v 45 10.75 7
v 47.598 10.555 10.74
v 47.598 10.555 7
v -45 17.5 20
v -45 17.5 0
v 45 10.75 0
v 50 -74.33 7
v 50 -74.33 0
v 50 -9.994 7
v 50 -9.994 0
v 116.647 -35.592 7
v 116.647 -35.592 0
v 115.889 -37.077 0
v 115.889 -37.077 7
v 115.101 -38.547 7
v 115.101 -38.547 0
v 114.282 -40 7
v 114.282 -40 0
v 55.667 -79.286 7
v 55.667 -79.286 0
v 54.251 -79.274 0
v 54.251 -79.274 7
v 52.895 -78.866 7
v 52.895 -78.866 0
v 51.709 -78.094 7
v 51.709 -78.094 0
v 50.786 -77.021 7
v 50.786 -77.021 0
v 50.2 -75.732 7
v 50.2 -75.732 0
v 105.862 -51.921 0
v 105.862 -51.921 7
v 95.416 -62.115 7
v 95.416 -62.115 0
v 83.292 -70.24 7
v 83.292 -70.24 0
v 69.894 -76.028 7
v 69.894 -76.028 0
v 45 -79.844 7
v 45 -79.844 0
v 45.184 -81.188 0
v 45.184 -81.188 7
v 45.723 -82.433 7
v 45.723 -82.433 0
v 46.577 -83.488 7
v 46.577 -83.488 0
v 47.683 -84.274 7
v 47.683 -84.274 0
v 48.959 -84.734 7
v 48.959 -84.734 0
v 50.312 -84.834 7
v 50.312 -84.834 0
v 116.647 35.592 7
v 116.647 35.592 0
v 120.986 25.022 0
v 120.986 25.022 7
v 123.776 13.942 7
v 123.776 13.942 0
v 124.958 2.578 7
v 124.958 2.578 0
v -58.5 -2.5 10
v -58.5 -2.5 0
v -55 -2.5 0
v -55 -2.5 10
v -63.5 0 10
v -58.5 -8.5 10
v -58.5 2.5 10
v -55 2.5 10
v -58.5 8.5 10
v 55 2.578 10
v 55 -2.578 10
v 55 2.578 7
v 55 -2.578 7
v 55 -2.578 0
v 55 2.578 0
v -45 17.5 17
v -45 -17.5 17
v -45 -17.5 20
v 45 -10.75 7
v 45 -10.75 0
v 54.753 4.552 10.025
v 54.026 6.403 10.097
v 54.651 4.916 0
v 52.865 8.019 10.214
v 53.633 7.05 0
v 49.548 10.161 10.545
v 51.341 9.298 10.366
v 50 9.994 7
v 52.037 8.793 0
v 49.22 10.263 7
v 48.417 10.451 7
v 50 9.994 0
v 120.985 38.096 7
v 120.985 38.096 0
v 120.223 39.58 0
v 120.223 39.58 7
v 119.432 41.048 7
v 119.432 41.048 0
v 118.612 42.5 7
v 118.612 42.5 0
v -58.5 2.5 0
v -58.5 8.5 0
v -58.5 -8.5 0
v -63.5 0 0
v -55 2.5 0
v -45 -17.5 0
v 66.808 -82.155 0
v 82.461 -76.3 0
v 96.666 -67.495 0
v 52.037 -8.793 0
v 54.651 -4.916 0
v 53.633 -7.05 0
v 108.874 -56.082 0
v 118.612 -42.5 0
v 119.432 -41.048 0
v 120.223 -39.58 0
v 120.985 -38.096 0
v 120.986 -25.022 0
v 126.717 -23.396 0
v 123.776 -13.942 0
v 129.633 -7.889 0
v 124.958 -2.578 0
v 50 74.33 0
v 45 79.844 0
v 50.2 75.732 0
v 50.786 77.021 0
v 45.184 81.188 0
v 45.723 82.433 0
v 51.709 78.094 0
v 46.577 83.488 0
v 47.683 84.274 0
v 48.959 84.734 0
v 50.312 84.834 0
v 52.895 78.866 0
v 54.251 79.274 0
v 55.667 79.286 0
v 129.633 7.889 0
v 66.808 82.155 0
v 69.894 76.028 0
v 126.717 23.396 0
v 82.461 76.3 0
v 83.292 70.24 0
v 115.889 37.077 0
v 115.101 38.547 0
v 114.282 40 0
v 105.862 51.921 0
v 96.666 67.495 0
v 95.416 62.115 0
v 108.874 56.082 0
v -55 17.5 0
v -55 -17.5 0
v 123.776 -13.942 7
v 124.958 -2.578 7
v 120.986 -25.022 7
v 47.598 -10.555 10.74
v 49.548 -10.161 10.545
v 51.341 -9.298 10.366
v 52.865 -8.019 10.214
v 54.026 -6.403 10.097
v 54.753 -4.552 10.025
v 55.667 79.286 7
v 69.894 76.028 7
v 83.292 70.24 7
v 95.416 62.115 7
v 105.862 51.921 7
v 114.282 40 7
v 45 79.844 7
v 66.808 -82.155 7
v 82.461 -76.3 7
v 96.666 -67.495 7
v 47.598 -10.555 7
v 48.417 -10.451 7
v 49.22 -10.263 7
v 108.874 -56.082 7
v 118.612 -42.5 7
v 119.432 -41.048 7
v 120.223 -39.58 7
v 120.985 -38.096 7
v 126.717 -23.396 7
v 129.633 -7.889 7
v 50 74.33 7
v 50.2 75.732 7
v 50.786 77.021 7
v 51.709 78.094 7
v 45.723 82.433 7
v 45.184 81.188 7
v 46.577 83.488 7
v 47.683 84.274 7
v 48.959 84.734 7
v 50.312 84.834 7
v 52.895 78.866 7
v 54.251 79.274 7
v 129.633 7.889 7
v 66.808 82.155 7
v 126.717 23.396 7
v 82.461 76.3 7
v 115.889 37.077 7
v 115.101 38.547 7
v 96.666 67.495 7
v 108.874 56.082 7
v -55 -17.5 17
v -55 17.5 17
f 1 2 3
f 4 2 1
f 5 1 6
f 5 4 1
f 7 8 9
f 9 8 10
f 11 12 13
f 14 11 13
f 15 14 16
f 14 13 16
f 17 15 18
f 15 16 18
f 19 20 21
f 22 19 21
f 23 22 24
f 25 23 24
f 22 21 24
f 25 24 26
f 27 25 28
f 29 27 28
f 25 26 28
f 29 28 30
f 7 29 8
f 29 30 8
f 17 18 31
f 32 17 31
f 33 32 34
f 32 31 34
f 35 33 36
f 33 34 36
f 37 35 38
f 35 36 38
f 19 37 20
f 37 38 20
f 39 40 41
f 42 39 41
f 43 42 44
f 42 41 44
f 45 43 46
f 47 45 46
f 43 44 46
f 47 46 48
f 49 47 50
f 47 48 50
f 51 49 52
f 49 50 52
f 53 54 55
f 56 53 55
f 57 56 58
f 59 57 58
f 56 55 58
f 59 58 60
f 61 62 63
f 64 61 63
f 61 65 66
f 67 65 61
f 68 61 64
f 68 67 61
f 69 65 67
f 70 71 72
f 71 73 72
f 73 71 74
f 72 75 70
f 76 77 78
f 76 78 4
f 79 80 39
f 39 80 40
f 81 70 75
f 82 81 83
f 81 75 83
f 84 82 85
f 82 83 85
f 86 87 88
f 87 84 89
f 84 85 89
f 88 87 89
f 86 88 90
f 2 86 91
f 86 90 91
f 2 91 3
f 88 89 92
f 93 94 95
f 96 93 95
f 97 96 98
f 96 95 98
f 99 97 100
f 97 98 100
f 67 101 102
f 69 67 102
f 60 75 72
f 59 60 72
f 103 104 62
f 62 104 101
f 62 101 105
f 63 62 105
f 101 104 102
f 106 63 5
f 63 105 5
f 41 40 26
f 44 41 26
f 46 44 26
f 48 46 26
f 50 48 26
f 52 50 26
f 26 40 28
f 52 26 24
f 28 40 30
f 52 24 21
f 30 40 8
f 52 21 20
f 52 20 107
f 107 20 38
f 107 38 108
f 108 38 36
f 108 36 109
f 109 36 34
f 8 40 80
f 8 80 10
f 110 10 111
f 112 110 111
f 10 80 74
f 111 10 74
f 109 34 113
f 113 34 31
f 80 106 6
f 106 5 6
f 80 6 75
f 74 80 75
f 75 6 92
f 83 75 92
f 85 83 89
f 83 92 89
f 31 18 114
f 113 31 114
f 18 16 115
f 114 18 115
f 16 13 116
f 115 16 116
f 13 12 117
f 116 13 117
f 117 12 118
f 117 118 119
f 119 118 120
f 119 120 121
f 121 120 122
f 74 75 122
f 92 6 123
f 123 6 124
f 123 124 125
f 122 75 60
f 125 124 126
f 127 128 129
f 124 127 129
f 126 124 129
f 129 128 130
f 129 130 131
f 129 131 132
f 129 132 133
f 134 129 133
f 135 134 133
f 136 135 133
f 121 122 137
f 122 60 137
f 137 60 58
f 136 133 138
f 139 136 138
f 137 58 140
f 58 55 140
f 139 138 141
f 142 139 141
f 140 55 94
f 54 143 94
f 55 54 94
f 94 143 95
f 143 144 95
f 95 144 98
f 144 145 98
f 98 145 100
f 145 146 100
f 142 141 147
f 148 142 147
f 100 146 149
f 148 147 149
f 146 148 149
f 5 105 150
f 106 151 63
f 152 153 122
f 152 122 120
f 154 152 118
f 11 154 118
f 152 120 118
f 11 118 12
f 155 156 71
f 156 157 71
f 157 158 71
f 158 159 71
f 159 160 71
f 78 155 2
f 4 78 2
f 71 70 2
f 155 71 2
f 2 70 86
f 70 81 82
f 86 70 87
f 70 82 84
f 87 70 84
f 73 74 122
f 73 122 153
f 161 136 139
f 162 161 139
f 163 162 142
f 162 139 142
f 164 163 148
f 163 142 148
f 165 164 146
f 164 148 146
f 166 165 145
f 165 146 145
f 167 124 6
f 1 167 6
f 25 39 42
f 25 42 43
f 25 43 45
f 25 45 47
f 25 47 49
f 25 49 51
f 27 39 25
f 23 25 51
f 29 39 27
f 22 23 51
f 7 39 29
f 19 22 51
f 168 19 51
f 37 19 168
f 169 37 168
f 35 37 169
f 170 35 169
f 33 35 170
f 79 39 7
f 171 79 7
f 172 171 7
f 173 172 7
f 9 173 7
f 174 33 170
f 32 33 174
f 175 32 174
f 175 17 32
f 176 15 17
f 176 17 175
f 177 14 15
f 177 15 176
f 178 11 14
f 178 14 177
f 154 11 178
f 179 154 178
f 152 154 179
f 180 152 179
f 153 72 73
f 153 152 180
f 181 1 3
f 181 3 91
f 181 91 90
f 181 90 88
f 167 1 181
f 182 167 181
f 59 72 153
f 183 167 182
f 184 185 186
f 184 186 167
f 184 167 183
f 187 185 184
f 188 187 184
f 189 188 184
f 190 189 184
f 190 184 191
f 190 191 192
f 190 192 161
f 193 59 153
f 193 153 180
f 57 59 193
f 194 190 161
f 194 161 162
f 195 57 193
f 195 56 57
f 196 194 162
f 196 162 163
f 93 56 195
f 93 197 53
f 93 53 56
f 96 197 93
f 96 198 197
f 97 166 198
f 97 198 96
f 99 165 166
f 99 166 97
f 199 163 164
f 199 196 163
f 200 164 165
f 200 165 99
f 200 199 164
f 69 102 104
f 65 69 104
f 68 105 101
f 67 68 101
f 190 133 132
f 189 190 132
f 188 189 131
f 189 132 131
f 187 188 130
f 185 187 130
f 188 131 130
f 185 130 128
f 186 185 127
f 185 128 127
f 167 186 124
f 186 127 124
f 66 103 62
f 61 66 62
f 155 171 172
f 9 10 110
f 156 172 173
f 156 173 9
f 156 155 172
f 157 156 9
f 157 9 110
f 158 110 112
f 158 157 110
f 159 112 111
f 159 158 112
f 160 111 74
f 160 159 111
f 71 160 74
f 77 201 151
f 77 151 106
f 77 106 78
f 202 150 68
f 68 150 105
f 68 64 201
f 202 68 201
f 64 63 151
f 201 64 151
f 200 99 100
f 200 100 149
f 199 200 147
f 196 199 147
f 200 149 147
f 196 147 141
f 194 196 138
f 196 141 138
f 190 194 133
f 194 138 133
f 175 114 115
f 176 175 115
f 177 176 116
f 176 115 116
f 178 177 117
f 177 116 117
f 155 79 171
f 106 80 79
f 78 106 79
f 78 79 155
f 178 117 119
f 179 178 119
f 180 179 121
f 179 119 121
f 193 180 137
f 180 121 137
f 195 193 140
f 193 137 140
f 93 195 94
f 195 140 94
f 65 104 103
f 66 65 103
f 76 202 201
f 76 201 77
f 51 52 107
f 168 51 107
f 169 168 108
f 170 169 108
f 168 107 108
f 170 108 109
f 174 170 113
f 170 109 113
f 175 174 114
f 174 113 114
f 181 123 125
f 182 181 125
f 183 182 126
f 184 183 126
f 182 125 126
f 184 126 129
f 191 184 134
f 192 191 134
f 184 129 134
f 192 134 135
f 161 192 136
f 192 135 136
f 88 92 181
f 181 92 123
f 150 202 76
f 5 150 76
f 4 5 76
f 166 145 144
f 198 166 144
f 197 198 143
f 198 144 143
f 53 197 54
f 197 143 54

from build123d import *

# Parameters (mm, degrees)
F1_DEPTH = 10
F2_DEPTH = 17
F3_W     = 100
F3_H     = 35
F4_DEPTH = 3
F5_SIZE2 = 99.99999
F5_SIZE  = 7.49999
F6_SIZE2 = 9.99999
F6_SIZE  = 99.99999
F7_R     = 8
F9_DEPTH = 7
F10_W    = 5.1550631039
F10_H    = 7


# Not quite as in the source:
# - a fillet or chamfer is up to 0.001 mm smaller than in the source, because OpenCascade refuses the exact size
# - a feature of the source that left no trace in its solid (it failed there, or was rolled back) is left out


with BuildPart() as f1:
    # F0 (on Top) → F1 (new body)
    with BuildSketch(Plane.XY):
        Polygon((-58.5, -8.5), (-58.5, -2.5), (-58.5, 0), (-58.5, 2.5), (-58.5, 8.5), (-63.5, 0), align=None)
        Polygon((-58.5, -2.5), (-55, -2.5), (-55, 2.5), (-58.5, 2.5), (-58.5, 0), align=None)
    extrude(amount=F1_DEPTH)

    # F0 (on Top) → F2 (join)
    with BuildSketch(Plane.XY):
        Polygon((-55, -17.5), (55, -17.5), (55, 17.5), (-55, 17.5), (-55, 2.5), (-55, -2.5), align=None)
    extrude(amount=F2_DEPTH)

    # F3 (on face) → F4 (join)
    with BuildSketch(Plane.XY.offset(17)):
        with Locations((5, 0)):
            Rectangle(F3_W, F3_H)
    extrude(amount=F4_DEPTH)

    # F5 (size 7.5 and 100 in the source; OpenCascade refuses exactly that, so slightly less here)
    f5_edges = [f1.edges().sort_by_distance(p)[0] for p in [
        (55, -17.5, 10),
        (55, 17.5, 10),
    ]]
    f5_side = f1.faces().sort_by_distance((55, 0, 10))[0]
    chamfer(f5_edges, length=F5_SIZE, length2=F5_SIZE2, reference=f5_side)

    # F6 (size 100 and 10 in the source; OpenCascade refuses exactly that, so slightly less here)
    f6_edges = [f1.edges().sort_by_distance(p)[0] for p in [
        (55, 0, 20),
    ]]
    chamfer(f6_edges, length=F6_SIZE, length2=F6_SIZE2)

    # F7
    f7_edges = [f1.edges().sort_by_distance(p)[0] for p in [
        (55, -10.00001, 5.000005),
        (55, 10.00001, 5.000005),
    ]]
    fillet(f7_edges, radius=F7_R)

    # F8 (on face) → F9 (join)
    with BuildSketch(Plane.XY):
        with BuildLine():
            ThreePointArc((118.6121593217, 42.5), (89.7807277981, 72.2473973087), (50.3125, 84.8338219329))
            ThreePointArc((50.3125, 84.8338219329), (46.5767340156, 83.4879420476), (45, 79.8435971134))
            Line((45, 79.8435971134), (45, 0))
            Line((45, 0), (50, 2.8867513459))
            Line((50, 2.8867513459), (50, 74.3303437366))
            ThreePointArc((50, 74.3303437366), (51.708597057, 78.0942070001), (55.6666666667, 79.2856999857))
            ThreePointArc((55.6666666667, 79.2856999857), (89.5397594579, 66.4545696505), (114.2820323028, 40))
            Line((114.2820323028, 40), (118.6121593217, 42.5))
        make_face()
        with BuildLine():
            ThreePointArc((120.9846922835, 38.0962798523), (119.8308271392, 40.3155963576), (118.6121593217, 42.5))
            Line((118.6121593217, 42.5), (114.2820323028, 40))
            ThreePointArc((114.2820323028, 40), (115.4987732023, 37.8143223789), (116.6465834297, 35.5916715378))
            Line((116.6465834297, 35.5916715378), (120.9846922835, 38.0962798523))
        make_face()
        with BuildLine():
            ThreePointArc((120.9846922835, -38.0962798523), (130, 0), (120.9846922835, 38.0962798523))
            Line((120.9846922835, 38.0962798523), (116.6465834297, 35.5916715378))
            ThreePointArc((116.6465834297, 35.5916715378), (125, 0), (116.6465834297, -35.5916715378))
            Line((116.6465834297, -35.5916715378), (120.9846922835, -38.0962798523))
        make_face()
        with BuildLine():
            Line((50, -2.8867513459), (45, 0))
            Line((45, 0), (45, -79.8435971134))
            ThreePointArc((45, -79.8435971134), (46.5767340156, -83.4879420476), (50.3125, -84.8338219329))
            ThreePointArc((50.3125, -84.8338219329), (89.7807277981, -72.2473973087), (118.6121593217, -42.5))
            Line((118.6121593217, -42.5), (114.2820323028, -40))
            ThreePointArc((114.2820323028, -40), (89.5397594579, -66.4545696505), (55.6666666667, -79.2856999857))
            ThreePointArc((55.6666666667, -79.2856999857), (51.708597057, -78.0942070001), (50, -74.3303437366))
            Line((50, -74.3303437366), (50, -2.8867513459))
        make_face()
        Polygon((50, 2.8867513459), (45, 0), (50, -2.8867513459), align=None)
        with BuildLine():
            ThreePointArc((118.6121593217, -42.5), (119.8308271392, -40.3155963576), (120.9846922835, -38.0962798523))
            Line((120.9846922835, -38.0962798523), (116.6465834297, -35.5916715378))
            ThreePointArc((116.6465834297, -35.5916715378), (115.4987732023, -37.8143223789), (114.2820323028, -40))
            Line((114.2820323028, -40), (118.6121593217, -42.5))
        make_face()
    extrude(amount=F9_DEPTH)

    # F10 (on face) → F11 (join, up to the next surface of F1)
    with BuildSketch(Plane.YZ.offset(55)):
        with Locations((0, 3.5)):
            Rectangle(F10_W, F10_H)
    extrude(until=Until.NEXT)


solid = f1.part
